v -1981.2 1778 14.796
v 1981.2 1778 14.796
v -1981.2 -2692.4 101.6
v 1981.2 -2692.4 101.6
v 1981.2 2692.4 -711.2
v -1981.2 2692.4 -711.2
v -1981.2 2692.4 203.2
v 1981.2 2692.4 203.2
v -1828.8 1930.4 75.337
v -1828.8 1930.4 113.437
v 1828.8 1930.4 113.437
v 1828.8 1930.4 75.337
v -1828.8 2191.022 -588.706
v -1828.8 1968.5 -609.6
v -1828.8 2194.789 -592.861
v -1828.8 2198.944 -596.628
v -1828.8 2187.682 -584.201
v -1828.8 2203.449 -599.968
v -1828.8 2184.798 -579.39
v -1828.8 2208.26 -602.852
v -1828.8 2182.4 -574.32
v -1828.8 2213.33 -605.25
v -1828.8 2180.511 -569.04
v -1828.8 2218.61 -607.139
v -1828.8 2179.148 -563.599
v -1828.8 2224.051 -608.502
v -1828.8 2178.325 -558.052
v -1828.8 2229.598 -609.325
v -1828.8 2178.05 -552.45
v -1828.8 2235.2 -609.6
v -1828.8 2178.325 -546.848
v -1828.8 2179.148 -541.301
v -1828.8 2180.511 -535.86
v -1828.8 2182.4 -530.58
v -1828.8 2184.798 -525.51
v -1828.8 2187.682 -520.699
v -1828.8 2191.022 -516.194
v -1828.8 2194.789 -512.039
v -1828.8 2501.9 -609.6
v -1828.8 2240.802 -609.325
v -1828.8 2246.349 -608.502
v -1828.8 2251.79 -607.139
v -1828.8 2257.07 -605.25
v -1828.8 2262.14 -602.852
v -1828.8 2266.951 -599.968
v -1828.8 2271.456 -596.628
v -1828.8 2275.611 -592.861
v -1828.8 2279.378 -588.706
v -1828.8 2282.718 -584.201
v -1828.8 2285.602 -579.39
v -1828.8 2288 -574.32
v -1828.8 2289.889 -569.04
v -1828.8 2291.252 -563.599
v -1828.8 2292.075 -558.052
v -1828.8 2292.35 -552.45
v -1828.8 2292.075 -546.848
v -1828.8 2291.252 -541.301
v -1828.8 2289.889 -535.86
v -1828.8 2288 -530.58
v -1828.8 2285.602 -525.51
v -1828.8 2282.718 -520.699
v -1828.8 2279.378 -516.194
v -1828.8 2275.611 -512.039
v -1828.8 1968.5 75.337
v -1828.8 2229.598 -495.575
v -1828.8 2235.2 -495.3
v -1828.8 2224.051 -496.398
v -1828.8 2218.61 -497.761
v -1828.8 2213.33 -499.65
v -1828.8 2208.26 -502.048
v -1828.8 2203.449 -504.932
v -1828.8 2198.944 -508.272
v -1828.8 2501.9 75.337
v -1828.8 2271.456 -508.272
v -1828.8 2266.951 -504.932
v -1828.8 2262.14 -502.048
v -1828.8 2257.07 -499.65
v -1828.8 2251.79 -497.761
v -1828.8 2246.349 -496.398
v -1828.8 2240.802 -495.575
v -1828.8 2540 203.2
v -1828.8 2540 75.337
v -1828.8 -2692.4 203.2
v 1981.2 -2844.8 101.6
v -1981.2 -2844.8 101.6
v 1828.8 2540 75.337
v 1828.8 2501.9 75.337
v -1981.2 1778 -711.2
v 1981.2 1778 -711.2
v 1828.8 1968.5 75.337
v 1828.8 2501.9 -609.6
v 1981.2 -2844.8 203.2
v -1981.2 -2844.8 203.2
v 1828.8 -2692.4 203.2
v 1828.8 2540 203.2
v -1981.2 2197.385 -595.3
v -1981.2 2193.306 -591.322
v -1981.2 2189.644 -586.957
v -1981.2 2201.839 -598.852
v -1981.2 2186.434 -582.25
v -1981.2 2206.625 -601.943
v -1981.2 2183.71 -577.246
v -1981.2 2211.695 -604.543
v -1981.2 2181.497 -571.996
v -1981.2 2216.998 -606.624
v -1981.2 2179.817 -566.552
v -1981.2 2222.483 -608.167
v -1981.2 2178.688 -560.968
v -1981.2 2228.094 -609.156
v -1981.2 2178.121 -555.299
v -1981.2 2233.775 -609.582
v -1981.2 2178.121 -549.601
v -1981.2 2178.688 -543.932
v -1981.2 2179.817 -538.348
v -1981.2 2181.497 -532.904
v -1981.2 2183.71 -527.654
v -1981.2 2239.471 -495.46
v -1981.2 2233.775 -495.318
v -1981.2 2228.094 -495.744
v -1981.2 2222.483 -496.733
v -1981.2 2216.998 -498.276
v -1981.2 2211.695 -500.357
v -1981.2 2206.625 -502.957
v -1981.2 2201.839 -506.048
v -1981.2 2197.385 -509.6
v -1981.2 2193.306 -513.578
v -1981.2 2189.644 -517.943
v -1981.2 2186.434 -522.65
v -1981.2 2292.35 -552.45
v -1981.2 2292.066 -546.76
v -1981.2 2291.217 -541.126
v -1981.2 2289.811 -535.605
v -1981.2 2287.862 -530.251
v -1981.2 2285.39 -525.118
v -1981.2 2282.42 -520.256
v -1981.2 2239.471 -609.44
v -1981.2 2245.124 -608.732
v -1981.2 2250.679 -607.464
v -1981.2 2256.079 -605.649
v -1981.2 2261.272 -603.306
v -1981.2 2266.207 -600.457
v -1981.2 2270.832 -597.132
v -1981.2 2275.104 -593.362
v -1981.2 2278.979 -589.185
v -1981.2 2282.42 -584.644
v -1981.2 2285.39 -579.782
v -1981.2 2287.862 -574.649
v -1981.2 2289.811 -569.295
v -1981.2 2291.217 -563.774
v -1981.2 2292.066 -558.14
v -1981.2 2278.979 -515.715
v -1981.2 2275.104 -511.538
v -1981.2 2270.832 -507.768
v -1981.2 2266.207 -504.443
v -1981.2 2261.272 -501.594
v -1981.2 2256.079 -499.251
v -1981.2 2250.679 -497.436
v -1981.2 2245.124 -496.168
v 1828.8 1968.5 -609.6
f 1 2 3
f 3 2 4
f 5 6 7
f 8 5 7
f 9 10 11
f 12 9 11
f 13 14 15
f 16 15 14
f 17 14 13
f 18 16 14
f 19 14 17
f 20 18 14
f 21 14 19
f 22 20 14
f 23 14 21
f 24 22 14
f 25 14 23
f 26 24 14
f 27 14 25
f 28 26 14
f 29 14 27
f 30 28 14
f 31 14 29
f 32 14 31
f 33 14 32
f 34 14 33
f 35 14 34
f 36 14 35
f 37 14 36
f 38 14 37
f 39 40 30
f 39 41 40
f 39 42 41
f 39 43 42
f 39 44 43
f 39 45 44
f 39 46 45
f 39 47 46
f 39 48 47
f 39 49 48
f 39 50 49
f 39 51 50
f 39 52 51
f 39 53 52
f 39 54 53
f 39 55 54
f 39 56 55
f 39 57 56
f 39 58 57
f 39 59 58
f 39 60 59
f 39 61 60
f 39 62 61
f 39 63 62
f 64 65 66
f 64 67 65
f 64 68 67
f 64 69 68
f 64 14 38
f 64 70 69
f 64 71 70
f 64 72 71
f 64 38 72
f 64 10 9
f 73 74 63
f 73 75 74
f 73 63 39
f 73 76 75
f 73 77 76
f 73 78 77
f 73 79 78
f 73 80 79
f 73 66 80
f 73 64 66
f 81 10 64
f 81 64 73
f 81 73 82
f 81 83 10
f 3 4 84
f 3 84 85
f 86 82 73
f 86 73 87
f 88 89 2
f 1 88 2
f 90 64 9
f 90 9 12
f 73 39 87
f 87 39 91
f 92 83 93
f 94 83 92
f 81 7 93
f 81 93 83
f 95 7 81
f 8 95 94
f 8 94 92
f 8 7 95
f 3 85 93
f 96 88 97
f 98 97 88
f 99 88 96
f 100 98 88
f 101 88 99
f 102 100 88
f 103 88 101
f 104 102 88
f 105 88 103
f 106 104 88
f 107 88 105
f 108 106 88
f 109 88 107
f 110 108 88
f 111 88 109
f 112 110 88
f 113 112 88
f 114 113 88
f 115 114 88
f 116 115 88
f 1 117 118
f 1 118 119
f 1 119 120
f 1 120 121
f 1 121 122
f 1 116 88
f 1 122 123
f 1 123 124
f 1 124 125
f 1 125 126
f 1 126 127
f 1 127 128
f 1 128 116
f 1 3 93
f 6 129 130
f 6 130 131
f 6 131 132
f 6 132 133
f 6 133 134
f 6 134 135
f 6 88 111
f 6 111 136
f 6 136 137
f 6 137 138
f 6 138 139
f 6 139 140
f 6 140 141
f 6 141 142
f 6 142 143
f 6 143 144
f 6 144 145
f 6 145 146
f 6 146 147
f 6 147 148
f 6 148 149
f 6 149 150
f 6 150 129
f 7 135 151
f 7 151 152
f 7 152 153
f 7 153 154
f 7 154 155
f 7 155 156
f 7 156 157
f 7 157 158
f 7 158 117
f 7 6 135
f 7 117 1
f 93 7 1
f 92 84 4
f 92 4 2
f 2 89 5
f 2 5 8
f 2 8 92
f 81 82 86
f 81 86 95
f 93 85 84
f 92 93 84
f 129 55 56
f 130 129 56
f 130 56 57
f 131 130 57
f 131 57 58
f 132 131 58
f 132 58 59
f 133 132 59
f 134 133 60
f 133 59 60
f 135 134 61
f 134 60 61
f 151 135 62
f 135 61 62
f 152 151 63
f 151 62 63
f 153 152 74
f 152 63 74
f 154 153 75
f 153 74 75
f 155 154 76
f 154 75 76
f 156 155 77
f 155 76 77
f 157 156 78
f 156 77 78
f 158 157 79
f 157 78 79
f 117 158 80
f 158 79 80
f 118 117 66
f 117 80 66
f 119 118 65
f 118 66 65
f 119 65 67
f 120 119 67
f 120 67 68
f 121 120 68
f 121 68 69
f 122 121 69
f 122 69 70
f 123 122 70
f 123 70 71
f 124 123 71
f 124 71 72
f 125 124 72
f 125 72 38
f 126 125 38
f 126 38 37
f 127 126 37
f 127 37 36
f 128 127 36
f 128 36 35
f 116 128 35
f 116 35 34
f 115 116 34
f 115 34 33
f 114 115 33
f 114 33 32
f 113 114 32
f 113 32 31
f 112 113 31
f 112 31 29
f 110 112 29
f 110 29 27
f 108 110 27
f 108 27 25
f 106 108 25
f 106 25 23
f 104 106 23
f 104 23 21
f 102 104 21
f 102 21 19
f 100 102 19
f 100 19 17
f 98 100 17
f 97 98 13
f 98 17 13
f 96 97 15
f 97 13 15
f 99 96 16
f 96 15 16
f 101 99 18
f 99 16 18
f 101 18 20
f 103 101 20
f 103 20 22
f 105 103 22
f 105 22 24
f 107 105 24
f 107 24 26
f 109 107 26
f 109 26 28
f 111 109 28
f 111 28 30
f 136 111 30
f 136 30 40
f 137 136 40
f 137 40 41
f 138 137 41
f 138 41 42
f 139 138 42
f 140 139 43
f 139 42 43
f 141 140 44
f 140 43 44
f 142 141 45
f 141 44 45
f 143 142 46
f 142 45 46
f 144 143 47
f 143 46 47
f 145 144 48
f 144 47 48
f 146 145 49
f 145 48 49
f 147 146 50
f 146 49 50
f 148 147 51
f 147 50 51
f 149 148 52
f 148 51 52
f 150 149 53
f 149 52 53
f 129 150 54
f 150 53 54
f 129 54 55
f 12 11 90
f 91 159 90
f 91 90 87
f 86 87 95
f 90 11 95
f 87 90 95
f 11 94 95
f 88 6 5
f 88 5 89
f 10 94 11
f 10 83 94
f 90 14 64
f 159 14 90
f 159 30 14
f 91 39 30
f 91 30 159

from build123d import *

# Parameters (mm, degrees)
F0_W          = 3962.4
F0_H          = 5384.8
F1_DEPTH      = 203.2
F4_DEPTH      = 1828.8
F5_DEPTH      = 152.401
F6_DEPTH      = 152.401
F3_W          = 914.4
F3_H          = 914.4
F7_DEPTH      = 3962.4
F8_DEPTH      = 1828.8
F8_DEPTH_BACK = 1828.8
F9_W          = 3657.6
F9_H          = 609.6
F10_DEPTH     = 812.8
F11_W         = 3657.6
F11_H         = 38.1
F12_DEPTH     = 684.9368932039
F13_R         = 57.15
F14_DEPTH     = 152.401
F15_DEPTH     = 152.4


with BuildPart() as f1:
    # F0 (on Top) → F1 (new body)
    with BuildSketch(Plane.XY):
        Rectangle(F0_W, F0_H)
    extrude(amount=F1_DEPTH)

    # F2 (on Right) → F4 (cut, symmetric)
    with BuildSketch(Plane.YZ):
        Polygon((2540, 203.2), (-2692.4, 203.2), (2540, 101.6), align=None)
        Polygon((2540, 0), (-2692.4, 101.6), (-2692.4, 0), align=None)
    extrude(amount=F4_DEPTH, both=True, mode=Mode.SUBTRACT)

    # F5 (cut, through all): a face of the model
    f5_faces = [f1.faces().sort_by_distance(p)[0] for p in [
        (-1828.8, -948.2666666667, 33.8666666667),
    ]]
    extrude(f5_faces, amount=-F5_DEPTH, mode=Mode.SUBTRACT)

    # F6 (cut, through all): a face of the model
    f6_faces = [f1.faces().sort_by_distance(p)[0] for p in [
        (1828.8, -948.2666666667, 33.8666666667),
    ]]
    extrude(f6_faces, amount=-F6_DEPTH, mode=Mode.SUBTRACT)

    # F3 (on face) → F7 (join, through all)
    with BuildSketch(Plane(origin=(-1981.2, 0, 0), x_dir=(0, -1, 0), z_dir=(-1, 0, 0))):
        with Locations((-2235.2, -254)):
            Rectangle(F3_W, F3_H)
    extrude(amount=-F7_DEPTH)

    # F2 (on Right) → F8 (cut, two sides)
    with BuildSketch(Plane.YZ) as f8_sk:
        Polygon((2540, 203.2), (-2692.4, 203.2), (2540, 101.6), align=None)
    extrude(amount=-F8_DEPTH, mode=Mode.SUBTRACT)
    extrude(f8_sk.sketch, amount=F8_DEPTH_BACK, mode=Mode.SUBTRACT)

    # F9 (on face) → F10 (cut, through all)
    with BuildSketch(Plane.XY.offset(203.2)):
        with Locations((0, 2235.2)):
            Rectangle(F9_W, F9_H)
    extrude(amount=-F10_DEPTH, mode=Mode.SUBTRACT)

    # F11 (on face) → F12 (join, through all)
    with BuildSketch(Plane.XY.offset(-609.6)):
        with Locations((0, 2520.95)):
            Rectangle(F11_W, F11_H)
        with Locations((0, 1949.45)):
            Rectangle(F11_W, F11_H)
    extrude(amount=F12_DEPTH)

    # F13 (on face) → F14 (cut, through all)
    with BuildSketch(Plane.YZ.offset(-1828.8)):
        with Locations((2235.2, -552.45)):
            Circle(F13_R)
    extrude(amount=-F14_DEPTH, mode=Mode.SUBTRACT)

    # F15 (add): a face of the model
    f15_faces = [f1.faces().sort_by_distance(p)[0] for p in [
        (0, -2692.4, 152.4),
    ]]
    extrude(f15_faces, amount=F15_DEPTH)


solid = f1.part
